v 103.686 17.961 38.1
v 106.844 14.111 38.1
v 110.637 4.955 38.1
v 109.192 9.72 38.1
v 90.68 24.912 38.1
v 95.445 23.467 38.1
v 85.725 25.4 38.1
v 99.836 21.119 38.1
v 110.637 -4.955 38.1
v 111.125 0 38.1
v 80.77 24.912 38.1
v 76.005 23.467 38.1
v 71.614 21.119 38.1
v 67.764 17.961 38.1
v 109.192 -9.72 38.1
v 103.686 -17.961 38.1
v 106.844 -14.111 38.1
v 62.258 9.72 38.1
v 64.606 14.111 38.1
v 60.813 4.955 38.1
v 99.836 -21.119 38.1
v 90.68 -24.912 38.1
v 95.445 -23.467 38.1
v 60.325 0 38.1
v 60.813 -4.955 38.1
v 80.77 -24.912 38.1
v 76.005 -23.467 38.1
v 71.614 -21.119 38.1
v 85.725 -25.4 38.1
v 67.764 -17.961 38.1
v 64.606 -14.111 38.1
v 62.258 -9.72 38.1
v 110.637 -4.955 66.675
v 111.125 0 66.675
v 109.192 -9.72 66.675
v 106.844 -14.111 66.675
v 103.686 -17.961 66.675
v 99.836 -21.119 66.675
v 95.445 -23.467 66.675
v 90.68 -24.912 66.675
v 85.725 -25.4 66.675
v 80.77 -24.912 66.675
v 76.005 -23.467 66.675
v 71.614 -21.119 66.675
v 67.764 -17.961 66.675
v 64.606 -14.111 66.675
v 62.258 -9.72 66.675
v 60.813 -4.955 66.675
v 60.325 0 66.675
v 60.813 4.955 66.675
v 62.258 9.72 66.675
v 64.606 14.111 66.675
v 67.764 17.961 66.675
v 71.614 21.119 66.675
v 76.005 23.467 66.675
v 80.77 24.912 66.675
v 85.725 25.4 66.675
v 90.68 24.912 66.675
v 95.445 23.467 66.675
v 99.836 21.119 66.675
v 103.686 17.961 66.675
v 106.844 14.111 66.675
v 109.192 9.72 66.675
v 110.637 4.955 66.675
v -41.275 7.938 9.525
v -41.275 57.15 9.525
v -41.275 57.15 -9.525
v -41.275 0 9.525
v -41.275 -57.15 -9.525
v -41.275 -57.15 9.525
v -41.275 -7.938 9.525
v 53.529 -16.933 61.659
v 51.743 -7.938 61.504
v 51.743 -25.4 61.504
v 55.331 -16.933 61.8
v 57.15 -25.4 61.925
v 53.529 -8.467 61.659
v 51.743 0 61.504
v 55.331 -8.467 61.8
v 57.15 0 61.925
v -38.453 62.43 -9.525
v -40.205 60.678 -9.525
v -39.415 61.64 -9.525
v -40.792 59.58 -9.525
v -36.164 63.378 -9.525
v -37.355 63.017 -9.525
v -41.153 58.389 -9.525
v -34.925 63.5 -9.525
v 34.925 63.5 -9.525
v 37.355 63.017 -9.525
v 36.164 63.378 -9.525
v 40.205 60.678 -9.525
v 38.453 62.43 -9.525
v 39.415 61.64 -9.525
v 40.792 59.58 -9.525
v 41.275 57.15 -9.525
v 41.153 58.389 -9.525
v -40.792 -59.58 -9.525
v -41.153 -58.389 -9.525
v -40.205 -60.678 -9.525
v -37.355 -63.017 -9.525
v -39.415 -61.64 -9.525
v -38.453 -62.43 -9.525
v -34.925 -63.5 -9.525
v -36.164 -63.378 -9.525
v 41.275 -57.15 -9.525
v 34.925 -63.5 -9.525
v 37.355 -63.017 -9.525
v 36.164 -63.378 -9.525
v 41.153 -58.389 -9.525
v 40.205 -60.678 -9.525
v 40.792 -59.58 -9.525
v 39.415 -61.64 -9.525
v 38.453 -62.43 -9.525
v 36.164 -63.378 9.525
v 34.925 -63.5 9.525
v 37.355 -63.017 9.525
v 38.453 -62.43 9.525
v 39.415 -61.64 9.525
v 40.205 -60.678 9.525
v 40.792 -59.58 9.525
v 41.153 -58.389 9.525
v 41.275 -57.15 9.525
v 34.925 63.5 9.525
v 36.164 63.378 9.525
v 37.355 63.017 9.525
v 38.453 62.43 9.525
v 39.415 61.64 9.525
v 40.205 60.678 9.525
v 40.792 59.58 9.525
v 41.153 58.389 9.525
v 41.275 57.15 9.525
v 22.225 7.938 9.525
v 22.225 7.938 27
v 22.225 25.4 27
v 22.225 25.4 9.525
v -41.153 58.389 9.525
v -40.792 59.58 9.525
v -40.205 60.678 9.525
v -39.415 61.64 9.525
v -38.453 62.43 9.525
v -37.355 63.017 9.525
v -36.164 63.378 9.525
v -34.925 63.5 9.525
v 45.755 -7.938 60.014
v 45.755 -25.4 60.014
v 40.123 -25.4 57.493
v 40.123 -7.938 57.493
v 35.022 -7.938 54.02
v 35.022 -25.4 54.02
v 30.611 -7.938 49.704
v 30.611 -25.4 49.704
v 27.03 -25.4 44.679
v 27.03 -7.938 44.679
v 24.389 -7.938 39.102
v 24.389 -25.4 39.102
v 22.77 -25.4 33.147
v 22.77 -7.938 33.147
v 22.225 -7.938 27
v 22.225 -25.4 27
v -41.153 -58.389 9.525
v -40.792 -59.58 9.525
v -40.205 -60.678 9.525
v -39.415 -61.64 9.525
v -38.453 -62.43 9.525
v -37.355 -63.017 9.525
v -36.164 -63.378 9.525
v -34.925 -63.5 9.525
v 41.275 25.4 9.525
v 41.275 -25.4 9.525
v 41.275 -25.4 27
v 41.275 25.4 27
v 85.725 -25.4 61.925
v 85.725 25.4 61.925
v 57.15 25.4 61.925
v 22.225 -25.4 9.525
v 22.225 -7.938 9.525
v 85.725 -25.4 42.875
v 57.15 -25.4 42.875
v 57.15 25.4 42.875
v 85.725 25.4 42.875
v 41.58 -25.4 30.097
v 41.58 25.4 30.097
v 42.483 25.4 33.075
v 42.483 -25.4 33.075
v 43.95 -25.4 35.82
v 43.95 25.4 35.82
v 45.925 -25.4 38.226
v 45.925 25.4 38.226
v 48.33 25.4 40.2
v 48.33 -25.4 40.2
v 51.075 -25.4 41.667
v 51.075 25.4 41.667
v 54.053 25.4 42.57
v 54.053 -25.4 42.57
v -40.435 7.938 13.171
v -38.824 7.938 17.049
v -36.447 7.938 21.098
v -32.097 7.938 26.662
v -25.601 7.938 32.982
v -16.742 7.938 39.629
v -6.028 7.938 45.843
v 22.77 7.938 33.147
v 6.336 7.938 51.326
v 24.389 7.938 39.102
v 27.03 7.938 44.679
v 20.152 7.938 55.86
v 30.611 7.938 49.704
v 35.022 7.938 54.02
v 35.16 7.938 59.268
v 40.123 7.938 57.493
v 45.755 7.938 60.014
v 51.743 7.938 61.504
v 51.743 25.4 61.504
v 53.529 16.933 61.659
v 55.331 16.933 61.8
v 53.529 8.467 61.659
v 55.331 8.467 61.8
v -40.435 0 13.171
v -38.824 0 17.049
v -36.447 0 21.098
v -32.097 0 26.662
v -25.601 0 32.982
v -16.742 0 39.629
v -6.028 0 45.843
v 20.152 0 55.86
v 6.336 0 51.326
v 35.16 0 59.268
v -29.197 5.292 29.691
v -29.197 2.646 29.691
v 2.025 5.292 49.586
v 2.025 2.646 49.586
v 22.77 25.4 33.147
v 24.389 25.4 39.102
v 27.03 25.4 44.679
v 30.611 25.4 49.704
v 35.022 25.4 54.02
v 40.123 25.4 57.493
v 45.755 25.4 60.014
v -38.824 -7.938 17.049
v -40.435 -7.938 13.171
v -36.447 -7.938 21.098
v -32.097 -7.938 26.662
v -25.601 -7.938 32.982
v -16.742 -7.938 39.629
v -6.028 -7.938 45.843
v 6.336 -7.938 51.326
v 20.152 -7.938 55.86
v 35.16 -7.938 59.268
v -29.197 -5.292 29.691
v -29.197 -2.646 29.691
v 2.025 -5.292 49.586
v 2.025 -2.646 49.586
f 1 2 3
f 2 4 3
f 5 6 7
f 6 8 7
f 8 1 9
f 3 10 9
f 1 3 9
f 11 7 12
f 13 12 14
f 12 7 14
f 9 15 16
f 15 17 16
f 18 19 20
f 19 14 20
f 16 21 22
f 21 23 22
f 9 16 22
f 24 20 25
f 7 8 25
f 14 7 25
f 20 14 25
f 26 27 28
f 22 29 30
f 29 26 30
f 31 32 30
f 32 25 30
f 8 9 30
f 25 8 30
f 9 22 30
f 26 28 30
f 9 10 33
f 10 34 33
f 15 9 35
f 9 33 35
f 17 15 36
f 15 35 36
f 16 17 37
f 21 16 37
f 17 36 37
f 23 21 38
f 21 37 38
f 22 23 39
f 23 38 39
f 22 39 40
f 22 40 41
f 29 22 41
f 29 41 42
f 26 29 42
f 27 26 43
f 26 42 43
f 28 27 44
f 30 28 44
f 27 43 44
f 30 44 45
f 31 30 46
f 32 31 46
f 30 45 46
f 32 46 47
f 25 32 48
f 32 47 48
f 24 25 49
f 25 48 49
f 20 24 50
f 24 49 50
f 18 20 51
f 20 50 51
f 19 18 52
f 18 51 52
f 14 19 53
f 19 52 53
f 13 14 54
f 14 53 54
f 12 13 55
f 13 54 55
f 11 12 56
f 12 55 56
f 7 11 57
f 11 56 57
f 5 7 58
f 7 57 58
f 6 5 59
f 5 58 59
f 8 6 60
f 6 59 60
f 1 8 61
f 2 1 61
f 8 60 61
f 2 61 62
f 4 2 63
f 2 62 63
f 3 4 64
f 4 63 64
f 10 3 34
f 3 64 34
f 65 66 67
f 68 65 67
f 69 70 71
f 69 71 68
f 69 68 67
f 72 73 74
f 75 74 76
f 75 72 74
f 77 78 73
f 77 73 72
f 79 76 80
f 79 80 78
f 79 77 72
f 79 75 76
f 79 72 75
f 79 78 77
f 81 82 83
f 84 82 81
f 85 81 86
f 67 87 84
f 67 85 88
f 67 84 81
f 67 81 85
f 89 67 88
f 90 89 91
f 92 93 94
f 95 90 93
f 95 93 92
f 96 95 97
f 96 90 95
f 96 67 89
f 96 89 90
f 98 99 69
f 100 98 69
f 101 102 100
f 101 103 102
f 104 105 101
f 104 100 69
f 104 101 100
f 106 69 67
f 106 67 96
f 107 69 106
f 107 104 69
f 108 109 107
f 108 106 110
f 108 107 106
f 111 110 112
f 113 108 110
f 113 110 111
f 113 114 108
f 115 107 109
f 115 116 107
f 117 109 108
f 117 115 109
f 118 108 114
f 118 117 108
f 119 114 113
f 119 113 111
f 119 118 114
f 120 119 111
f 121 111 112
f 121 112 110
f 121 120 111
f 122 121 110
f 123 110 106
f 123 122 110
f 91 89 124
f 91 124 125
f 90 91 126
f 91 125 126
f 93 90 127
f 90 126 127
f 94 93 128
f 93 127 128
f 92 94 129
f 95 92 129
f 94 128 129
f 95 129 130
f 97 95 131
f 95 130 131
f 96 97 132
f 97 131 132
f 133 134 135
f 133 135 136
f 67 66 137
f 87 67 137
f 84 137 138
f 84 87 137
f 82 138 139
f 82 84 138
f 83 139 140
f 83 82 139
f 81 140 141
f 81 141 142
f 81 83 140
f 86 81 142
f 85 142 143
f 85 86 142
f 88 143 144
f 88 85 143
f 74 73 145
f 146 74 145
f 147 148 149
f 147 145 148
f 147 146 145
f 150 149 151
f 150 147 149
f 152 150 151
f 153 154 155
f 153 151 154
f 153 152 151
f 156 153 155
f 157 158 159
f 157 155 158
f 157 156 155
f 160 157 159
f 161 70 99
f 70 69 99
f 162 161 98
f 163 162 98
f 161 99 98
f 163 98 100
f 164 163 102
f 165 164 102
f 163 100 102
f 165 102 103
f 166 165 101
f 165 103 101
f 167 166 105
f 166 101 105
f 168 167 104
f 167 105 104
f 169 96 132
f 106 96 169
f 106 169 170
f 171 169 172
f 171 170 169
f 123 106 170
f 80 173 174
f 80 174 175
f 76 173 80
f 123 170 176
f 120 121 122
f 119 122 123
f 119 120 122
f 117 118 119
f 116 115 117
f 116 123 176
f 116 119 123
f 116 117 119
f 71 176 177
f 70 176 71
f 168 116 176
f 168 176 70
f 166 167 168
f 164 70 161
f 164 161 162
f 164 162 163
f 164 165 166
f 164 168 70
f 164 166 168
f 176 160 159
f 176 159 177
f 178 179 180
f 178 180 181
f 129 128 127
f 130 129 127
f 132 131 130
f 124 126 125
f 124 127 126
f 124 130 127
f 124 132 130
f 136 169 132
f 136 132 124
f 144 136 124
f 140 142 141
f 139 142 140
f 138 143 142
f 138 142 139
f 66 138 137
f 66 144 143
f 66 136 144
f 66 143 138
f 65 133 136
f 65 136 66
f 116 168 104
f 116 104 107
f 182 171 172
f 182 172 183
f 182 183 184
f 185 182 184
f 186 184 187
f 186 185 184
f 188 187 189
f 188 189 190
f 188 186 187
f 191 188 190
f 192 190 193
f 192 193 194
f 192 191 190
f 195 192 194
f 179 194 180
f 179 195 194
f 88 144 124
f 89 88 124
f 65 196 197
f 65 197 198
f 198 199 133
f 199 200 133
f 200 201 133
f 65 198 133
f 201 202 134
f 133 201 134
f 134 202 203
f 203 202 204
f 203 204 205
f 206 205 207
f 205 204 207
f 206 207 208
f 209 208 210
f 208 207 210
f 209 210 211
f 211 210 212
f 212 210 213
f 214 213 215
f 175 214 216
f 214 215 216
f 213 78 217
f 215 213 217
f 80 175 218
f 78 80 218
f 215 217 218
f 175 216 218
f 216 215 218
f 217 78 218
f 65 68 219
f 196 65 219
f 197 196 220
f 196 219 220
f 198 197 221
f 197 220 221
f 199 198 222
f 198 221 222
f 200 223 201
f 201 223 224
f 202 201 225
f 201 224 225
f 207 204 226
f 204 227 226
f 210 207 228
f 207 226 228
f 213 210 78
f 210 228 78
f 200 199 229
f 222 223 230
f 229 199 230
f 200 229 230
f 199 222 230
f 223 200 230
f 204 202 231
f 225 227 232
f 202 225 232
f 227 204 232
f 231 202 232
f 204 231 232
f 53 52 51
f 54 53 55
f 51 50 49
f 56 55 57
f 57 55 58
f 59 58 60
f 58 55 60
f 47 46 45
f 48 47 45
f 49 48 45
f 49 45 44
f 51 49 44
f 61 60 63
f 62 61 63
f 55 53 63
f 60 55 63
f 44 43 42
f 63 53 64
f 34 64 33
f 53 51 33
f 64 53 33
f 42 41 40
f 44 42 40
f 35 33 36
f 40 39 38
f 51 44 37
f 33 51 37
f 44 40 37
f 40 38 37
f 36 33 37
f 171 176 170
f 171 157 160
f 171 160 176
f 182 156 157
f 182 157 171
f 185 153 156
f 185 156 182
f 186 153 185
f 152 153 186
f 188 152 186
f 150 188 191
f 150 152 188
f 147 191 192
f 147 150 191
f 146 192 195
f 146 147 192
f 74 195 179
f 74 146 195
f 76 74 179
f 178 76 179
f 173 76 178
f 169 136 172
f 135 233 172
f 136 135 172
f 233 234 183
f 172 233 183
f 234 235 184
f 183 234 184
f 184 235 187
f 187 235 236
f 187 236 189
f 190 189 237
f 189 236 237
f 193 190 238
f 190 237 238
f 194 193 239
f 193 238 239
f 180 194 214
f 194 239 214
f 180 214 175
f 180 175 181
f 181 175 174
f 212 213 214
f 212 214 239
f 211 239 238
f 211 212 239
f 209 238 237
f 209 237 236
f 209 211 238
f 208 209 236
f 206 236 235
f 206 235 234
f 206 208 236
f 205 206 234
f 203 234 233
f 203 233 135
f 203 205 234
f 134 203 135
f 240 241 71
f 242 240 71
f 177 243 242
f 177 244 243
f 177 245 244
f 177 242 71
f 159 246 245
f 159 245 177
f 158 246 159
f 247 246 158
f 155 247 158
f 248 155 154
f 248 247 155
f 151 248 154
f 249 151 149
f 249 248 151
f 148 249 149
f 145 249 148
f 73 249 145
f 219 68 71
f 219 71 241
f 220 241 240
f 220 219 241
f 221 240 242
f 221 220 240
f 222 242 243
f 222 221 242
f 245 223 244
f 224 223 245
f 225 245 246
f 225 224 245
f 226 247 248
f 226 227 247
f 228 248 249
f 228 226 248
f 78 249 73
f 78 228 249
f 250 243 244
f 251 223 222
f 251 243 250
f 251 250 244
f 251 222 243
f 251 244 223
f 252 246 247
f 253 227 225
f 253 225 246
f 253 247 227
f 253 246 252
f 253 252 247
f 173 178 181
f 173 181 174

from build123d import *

# Parameters (mm, degrees)
F1_DEPTH = 63.5
F0_W     = 25.4
F0_H     = 19.05
F2_DEPTH = 25.4
F3_DEPTH = 7.9375
F5_R     = 6.35


with BuildPart() as f1:
    # F0 (on Front) → F1 (new body, symmetric)
    with BuildSketch(Plane.XZ):
        Polygon((41.275, -9.525), (41.275, 9.525), (22.225, 9.525), (-41.275, 9.525), (-41.275, -9.525), align=None)
    extrude(amount=F1_DEPTH, both=True)

    # F0 (on Front) → F2 (join, symmetric)
    with BuildSketch(Plane.XZ):
        with BuildLine():
            Line((22.225, 9.525), (41.275, 9.525))
            Line((41.275, 9.525), (41.275, 27.0002))
            ThreePointArc((41.275, 27.0002), (45.9246798487, 38.2255201513), (57.15, 42.8752))
            Line((57.15, 42.8752), (60.325, 42.8752))
            Line((60.325, 42.8752), (60.325, 61.9252))
            Line((60.325, 61.9252), (57.15, 61.9252))
            add(Edge.make_bspline(
                [(51.7432814428, 61.5041565767), (53.5210330671, 61.6663637287), (55.3232994802, 61.8070317712), (57.15, 61.9252)],
                knots=[108.2296061322, 108.2296061322, 108.2296061322, 108.2296061322, 111.5045361635, 111.5045361635, 111.5045361635, 111.5045361635], degree=3))
            ThreePointArc((51.7432814428, 61.5041565767), (30.6114876961, 49.704010026), (22.225, 27.0002))
            Line((22.225, 27.0002), (22.225, 9.525))
        make_face()
        with Locations((73.025, 52.4002)):
            Rectangle(F0_W, F0_H)
    extrude(amount=F2_DEPTH, both=True)

    # F0 (on Front) → F3 (join, symmetric)
    with BuildSketch(Plane.XZ):
        with BuildLine():
            Line((-41.275, 9.525), (22.225, 9.525))
            Line((22.225, 9.525), (22.225, 27.0002))
            ThreePointArc((22.225, 27.0002), (30.6114876961, 49.704010026), (51.7432814428, 61.5041565767))
            add(Edge.make_bspline(
                [(-41.275, 9.525), (-38.9844993253, 27.2586870985), (-7.0077014052, 56.1435485602), (51.7432814428, 61.5041565767)],
                knots=[0, 0, 0, 0, 108.2296061322, 108.2296061322, 108.2296061322, 108.2296061322], degree=3))
        make_face()
    extrude(amount=F3_DEPTH, both=True)

    # F5
    f5_edges = [f1.edges().sort_by_distance(p)[0] for p in [
        (41.275, -63.5, 0),
        (-41.275, -63.5, 0),
        (41.275, 63.5, 0),
        (-41.275, 63.5, 0),
    ]]
    fillet(f5_edges, radius=F5_R)


with BuildPart() as f4:
    # F0 (on Front) → F4 (revolve)
    with BuildSketch(Plane.XZ):
        Polygon((85.725, 61.9252), (85.725, 42.8752), (85.725, 38.1), (111.125, 38.1), (111.125, 66.675), (85.725, 66.675), align=None)
    revolve(axis=Axis((85.725, 0, 52.3875), (0, 0, -1)))


solid = Compound([f1.part, f4.part])
